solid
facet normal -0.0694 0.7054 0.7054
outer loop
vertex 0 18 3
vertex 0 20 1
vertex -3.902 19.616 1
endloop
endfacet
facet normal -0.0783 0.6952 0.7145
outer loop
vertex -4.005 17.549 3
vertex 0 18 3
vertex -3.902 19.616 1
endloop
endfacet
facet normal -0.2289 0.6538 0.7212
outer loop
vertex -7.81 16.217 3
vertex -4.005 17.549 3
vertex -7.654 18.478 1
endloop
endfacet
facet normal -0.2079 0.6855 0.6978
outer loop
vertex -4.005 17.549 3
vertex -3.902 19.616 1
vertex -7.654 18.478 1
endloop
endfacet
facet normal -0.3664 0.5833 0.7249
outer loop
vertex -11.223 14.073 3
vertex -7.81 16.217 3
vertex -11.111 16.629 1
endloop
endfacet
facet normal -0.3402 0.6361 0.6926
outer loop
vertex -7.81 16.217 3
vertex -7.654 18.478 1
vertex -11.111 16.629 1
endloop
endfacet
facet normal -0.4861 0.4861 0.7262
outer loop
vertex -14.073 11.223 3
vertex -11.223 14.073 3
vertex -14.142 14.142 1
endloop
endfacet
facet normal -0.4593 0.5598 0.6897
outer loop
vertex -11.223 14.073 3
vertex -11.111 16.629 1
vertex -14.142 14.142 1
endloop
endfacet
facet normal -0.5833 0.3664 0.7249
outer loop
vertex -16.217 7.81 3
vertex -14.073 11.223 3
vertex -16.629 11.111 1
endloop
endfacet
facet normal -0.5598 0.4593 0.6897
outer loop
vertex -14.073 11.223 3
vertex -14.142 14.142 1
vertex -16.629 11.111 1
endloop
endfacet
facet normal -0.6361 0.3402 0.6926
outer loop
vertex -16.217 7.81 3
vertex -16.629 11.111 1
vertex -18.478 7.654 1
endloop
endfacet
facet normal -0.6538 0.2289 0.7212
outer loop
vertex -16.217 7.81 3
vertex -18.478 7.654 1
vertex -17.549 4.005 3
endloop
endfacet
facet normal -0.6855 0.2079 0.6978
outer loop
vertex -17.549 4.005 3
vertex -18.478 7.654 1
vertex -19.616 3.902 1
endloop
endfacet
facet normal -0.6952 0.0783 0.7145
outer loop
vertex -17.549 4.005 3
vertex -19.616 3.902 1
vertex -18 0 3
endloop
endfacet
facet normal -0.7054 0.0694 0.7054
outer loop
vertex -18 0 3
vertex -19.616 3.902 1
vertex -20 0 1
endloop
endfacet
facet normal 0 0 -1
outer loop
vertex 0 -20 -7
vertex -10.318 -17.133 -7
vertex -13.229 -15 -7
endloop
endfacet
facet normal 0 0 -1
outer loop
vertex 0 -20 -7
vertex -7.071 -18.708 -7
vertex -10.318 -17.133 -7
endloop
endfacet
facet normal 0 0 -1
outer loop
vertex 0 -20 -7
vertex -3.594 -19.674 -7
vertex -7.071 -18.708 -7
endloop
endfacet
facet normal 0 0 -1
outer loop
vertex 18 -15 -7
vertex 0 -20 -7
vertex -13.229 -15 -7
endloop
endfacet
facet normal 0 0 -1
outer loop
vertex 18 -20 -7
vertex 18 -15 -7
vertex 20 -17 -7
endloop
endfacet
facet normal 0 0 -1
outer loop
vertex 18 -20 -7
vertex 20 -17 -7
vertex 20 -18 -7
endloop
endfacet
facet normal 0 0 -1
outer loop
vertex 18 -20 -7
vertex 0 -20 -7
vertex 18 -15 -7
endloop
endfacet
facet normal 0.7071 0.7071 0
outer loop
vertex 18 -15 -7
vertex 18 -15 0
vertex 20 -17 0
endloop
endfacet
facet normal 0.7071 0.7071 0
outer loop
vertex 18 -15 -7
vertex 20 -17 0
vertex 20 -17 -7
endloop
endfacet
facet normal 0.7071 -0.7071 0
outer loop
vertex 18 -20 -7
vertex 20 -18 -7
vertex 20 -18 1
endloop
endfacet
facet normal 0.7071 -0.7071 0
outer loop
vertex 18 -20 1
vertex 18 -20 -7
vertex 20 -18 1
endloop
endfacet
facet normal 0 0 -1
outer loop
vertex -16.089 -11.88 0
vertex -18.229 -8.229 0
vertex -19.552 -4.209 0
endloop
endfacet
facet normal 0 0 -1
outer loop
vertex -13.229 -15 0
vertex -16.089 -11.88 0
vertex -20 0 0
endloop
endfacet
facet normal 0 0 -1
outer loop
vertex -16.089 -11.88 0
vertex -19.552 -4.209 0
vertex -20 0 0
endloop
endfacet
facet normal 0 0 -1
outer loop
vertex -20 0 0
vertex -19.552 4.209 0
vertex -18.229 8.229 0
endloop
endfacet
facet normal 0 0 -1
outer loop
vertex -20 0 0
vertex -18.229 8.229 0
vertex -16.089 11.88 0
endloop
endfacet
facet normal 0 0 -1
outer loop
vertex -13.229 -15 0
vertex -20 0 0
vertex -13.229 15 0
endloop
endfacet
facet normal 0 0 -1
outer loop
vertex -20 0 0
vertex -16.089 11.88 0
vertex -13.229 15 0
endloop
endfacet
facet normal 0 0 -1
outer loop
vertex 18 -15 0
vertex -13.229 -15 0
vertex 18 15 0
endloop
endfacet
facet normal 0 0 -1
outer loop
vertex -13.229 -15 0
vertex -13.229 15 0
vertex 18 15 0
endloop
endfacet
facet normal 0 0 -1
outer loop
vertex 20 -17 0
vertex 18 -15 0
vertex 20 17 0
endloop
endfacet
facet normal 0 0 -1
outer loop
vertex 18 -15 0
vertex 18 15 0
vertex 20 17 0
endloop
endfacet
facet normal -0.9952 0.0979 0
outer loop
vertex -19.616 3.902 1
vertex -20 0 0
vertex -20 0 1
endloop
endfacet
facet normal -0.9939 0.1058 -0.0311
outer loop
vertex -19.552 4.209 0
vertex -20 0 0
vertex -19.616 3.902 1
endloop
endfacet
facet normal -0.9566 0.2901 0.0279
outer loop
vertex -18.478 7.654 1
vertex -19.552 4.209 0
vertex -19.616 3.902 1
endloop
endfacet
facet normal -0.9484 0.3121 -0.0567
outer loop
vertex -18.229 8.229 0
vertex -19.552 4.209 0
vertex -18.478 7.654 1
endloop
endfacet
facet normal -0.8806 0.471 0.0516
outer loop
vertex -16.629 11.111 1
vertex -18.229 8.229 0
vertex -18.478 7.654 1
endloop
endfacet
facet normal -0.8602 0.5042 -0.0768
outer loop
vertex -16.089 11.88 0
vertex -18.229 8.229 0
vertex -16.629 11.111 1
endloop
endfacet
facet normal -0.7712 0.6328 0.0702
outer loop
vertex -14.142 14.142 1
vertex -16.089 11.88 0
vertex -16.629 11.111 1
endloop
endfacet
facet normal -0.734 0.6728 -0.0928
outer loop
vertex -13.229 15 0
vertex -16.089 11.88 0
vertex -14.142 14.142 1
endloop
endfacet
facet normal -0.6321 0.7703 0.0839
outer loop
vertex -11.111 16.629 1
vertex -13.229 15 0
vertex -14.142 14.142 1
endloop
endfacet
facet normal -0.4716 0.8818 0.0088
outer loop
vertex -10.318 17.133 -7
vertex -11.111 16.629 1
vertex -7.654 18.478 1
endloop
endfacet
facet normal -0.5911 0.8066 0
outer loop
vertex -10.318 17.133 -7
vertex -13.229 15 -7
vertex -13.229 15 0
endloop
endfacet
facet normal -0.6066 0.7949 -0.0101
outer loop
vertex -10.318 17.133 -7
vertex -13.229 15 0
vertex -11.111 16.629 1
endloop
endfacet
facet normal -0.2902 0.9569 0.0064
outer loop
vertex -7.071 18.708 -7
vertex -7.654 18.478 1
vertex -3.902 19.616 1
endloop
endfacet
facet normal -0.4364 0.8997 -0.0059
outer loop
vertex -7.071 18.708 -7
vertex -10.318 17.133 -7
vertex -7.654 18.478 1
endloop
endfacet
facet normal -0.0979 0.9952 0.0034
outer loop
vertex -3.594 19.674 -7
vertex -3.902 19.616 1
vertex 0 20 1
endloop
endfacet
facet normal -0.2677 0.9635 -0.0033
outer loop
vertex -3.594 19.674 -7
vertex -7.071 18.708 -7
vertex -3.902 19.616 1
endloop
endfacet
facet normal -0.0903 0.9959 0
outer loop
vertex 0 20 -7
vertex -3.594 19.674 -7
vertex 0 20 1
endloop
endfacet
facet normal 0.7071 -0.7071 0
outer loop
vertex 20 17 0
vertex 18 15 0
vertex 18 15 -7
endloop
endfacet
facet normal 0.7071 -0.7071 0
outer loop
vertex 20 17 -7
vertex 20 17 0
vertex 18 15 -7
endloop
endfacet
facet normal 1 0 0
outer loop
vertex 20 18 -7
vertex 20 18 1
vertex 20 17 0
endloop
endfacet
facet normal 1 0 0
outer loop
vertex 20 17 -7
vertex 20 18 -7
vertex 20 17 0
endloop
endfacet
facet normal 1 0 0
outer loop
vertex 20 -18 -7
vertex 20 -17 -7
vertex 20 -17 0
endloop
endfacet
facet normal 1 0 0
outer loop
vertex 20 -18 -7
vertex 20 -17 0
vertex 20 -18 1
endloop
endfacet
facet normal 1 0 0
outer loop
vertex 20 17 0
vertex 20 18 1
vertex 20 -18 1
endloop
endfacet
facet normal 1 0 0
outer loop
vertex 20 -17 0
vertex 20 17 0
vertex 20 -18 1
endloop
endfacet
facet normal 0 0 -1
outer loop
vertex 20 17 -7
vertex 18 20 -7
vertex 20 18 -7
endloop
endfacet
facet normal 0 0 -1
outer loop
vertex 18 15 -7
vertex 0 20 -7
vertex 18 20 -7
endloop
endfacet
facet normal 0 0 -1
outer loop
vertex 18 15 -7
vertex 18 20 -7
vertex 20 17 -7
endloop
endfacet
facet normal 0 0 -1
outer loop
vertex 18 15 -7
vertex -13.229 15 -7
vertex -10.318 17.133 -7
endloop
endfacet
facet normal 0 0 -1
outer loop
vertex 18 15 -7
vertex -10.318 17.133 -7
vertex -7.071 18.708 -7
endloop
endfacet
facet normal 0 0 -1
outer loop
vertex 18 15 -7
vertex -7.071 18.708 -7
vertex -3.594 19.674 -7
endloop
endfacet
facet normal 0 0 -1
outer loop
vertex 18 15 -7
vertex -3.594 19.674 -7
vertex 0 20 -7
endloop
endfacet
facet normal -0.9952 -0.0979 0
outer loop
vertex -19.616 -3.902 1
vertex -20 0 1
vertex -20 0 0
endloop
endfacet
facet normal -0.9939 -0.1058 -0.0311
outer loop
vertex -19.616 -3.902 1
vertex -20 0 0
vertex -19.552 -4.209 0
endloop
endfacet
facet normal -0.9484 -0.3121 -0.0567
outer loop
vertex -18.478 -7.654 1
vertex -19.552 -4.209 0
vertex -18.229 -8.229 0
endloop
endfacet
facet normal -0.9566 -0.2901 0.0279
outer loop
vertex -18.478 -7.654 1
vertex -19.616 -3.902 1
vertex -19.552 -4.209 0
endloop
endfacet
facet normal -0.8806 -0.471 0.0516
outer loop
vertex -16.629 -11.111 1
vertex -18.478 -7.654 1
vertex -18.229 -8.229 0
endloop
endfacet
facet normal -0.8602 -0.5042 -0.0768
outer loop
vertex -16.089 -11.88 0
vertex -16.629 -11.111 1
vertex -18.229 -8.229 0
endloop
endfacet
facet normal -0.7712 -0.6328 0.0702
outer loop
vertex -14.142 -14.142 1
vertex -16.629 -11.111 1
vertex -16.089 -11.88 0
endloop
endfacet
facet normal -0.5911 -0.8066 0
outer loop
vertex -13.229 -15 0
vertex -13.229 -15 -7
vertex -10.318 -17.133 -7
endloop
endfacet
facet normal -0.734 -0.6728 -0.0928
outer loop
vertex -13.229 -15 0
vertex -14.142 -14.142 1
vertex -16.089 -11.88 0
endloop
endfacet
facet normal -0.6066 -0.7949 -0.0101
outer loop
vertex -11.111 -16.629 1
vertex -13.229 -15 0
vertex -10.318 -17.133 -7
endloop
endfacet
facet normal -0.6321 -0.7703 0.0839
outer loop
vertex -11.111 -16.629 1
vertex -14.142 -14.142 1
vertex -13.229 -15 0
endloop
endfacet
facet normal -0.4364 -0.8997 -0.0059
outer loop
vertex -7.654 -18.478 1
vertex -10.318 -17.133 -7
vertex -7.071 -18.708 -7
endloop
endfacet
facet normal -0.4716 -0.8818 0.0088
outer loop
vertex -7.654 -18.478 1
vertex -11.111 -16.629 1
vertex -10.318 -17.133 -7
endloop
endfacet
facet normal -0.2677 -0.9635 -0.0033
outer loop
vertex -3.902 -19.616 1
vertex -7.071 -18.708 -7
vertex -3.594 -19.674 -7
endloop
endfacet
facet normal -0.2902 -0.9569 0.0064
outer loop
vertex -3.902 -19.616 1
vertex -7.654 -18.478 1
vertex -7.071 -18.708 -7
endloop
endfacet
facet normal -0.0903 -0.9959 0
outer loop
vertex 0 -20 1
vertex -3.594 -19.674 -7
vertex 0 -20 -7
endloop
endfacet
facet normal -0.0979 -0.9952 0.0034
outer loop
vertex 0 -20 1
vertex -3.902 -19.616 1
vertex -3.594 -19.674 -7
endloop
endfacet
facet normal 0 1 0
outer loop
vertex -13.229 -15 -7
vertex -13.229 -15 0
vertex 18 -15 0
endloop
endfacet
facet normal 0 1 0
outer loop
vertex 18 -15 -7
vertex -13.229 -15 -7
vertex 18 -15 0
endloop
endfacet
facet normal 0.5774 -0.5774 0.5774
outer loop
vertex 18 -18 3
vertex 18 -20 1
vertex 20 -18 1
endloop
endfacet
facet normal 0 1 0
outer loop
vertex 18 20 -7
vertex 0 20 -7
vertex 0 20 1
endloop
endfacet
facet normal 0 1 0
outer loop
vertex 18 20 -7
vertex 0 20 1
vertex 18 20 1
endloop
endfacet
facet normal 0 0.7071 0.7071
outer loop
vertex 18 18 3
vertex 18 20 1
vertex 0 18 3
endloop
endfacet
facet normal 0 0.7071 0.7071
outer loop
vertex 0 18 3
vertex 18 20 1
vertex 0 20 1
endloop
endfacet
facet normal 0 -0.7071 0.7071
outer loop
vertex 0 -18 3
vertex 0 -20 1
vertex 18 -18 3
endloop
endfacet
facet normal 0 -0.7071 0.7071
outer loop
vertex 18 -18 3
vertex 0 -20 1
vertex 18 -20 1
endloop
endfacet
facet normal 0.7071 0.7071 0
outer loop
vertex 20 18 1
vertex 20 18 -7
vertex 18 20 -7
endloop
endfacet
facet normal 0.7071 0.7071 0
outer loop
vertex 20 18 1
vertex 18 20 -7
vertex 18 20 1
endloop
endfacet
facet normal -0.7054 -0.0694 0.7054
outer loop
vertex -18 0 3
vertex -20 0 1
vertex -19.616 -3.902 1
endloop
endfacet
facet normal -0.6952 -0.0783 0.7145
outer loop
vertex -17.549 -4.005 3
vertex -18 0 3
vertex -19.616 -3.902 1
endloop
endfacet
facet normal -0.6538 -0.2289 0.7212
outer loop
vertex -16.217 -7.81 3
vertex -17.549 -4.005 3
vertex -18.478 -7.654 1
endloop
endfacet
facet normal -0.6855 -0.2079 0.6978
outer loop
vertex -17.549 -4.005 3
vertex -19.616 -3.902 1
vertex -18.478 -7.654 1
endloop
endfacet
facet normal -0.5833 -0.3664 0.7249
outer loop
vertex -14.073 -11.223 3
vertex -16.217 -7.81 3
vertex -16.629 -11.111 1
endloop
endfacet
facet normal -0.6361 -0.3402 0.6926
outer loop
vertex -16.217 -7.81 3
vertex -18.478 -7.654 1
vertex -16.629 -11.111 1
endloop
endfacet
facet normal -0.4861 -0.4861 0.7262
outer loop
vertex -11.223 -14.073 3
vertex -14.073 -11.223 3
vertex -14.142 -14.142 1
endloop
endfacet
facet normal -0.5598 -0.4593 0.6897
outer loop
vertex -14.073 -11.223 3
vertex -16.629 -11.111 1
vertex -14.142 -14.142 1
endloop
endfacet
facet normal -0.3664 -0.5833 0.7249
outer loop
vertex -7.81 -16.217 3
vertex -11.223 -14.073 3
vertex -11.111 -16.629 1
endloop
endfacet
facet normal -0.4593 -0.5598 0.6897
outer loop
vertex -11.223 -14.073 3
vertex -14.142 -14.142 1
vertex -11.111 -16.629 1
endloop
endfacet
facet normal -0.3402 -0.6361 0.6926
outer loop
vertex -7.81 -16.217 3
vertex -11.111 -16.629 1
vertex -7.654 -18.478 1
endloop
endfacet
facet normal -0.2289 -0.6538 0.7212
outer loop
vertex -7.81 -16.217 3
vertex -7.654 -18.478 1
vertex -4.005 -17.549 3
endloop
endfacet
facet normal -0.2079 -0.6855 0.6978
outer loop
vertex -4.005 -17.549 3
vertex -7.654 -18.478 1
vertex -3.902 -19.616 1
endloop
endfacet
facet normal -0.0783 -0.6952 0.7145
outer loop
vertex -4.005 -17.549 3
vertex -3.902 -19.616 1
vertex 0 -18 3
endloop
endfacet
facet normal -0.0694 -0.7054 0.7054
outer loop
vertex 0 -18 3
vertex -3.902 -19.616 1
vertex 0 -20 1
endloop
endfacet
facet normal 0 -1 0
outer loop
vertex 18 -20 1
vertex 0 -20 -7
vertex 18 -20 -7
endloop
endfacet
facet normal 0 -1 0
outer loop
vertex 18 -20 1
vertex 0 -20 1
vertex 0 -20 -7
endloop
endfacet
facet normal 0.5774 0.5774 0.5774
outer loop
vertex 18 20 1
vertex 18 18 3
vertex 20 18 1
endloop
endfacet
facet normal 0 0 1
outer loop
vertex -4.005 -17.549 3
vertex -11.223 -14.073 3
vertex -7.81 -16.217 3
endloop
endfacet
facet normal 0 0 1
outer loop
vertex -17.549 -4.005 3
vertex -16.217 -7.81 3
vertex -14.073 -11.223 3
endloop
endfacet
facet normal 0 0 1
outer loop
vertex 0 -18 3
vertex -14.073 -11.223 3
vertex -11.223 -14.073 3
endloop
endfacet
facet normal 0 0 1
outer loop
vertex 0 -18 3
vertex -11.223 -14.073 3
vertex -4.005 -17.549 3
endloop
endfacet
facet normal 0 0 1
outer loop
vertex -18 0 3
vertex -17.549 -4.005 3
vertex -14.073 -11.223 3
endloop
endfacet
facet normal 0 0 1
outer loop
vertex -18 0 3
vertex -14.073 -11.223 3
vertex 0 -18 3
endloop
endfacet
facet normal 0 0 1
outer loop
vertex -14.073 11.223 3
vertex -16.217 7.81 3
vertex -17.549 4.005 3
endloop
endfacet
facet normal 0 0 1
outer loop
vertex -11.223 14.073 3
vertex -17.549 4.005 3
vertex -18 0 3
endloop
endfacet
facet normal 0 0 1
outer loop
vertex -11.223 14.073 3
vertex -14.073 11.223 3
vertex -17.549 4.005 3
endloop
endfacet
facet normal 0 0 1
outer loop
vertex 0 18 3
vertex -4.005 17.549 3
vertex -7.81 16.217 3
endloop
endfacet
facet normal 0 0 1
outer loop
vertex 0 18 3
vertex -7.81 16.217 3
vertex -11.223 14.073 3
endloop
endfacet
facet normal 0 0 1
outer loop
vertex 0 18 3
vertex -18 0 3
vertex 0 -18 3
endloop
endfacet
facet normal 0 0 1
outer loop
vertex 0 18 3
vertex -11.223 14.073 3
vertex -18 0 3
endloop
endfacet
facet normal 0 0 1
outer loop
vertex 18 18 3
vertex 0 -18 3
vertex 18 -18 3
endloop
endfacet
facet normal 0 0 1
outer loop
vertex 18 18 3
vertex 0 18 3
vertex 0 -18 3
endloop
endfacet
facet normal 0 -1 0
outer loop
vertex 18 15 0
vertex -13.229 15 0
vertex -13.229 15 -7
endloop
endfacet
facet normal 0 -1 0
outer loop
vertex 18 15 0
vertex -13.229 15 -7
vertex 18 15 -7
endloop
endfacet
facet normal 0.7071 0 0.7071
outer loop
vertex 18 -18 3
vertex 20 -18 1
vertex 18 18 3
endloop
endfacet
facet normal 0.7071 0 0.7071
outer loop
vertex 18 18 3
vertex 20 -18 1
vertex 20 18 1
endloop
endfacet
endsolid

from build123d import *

# Parameters (mm, degrees)
F0_W     = 40
F0_H     = 40
F1_DEPTH = 3
F2_W     = 40
F2_H     = 5
F3_DEPTH = 7
F4_R     = 19.99999
F5_SIZE  = 2


# Not quite as in the source:
# - a fillet or chamfer is up to 0.001 mm smaller than in the source, because OpenCascade refuses the exact size


with BuildPart() as f1:
    # F0 (on Top) → F1 (new body)
    with BuildSketch(Plane.XY):
        Rectangle(F0_W, F0_H)
    extrude(amount=F1_DEPTH)

    # F2 (on face) → F3 (join)
    with BuildSketch(Plane(origin=(0, 0, 0), x_dir=(1, 0, 0), z_dir=(0, 0, -1))):
        with Locations((0, 17.5)):
            Rectangle(F2_W, F2_H)
        with Locations((0, -17.5)):
            Rectangle(F2_W, F2_H)
    extrude(amount=F3_DEPTH)

    # F4 (radius 20 in the source; OpenCascade refuses exactly that, so slightly less here)
    f4_edges = [f1.edges().sort_by_distance(p)[0] for p in [
        (-20, 20, -2),
        (-20, -20, -2),
    ]]
    fillet(f4_edges, radius=F4_R)

    # F5
    f5_edges = [f1.edges().sort_by_distance(p)[0] for p in [
        (-14.142139, -14.142139, 3),
        (20, -20, -2),
        (20, 0, 3),
        (20, 20, -2),
        (20, 15, -3.5),
        (20, -15, -3.5),
    ]]
    chamfer(f5_edges, length=F5_SIZE)


solid = f1.part
